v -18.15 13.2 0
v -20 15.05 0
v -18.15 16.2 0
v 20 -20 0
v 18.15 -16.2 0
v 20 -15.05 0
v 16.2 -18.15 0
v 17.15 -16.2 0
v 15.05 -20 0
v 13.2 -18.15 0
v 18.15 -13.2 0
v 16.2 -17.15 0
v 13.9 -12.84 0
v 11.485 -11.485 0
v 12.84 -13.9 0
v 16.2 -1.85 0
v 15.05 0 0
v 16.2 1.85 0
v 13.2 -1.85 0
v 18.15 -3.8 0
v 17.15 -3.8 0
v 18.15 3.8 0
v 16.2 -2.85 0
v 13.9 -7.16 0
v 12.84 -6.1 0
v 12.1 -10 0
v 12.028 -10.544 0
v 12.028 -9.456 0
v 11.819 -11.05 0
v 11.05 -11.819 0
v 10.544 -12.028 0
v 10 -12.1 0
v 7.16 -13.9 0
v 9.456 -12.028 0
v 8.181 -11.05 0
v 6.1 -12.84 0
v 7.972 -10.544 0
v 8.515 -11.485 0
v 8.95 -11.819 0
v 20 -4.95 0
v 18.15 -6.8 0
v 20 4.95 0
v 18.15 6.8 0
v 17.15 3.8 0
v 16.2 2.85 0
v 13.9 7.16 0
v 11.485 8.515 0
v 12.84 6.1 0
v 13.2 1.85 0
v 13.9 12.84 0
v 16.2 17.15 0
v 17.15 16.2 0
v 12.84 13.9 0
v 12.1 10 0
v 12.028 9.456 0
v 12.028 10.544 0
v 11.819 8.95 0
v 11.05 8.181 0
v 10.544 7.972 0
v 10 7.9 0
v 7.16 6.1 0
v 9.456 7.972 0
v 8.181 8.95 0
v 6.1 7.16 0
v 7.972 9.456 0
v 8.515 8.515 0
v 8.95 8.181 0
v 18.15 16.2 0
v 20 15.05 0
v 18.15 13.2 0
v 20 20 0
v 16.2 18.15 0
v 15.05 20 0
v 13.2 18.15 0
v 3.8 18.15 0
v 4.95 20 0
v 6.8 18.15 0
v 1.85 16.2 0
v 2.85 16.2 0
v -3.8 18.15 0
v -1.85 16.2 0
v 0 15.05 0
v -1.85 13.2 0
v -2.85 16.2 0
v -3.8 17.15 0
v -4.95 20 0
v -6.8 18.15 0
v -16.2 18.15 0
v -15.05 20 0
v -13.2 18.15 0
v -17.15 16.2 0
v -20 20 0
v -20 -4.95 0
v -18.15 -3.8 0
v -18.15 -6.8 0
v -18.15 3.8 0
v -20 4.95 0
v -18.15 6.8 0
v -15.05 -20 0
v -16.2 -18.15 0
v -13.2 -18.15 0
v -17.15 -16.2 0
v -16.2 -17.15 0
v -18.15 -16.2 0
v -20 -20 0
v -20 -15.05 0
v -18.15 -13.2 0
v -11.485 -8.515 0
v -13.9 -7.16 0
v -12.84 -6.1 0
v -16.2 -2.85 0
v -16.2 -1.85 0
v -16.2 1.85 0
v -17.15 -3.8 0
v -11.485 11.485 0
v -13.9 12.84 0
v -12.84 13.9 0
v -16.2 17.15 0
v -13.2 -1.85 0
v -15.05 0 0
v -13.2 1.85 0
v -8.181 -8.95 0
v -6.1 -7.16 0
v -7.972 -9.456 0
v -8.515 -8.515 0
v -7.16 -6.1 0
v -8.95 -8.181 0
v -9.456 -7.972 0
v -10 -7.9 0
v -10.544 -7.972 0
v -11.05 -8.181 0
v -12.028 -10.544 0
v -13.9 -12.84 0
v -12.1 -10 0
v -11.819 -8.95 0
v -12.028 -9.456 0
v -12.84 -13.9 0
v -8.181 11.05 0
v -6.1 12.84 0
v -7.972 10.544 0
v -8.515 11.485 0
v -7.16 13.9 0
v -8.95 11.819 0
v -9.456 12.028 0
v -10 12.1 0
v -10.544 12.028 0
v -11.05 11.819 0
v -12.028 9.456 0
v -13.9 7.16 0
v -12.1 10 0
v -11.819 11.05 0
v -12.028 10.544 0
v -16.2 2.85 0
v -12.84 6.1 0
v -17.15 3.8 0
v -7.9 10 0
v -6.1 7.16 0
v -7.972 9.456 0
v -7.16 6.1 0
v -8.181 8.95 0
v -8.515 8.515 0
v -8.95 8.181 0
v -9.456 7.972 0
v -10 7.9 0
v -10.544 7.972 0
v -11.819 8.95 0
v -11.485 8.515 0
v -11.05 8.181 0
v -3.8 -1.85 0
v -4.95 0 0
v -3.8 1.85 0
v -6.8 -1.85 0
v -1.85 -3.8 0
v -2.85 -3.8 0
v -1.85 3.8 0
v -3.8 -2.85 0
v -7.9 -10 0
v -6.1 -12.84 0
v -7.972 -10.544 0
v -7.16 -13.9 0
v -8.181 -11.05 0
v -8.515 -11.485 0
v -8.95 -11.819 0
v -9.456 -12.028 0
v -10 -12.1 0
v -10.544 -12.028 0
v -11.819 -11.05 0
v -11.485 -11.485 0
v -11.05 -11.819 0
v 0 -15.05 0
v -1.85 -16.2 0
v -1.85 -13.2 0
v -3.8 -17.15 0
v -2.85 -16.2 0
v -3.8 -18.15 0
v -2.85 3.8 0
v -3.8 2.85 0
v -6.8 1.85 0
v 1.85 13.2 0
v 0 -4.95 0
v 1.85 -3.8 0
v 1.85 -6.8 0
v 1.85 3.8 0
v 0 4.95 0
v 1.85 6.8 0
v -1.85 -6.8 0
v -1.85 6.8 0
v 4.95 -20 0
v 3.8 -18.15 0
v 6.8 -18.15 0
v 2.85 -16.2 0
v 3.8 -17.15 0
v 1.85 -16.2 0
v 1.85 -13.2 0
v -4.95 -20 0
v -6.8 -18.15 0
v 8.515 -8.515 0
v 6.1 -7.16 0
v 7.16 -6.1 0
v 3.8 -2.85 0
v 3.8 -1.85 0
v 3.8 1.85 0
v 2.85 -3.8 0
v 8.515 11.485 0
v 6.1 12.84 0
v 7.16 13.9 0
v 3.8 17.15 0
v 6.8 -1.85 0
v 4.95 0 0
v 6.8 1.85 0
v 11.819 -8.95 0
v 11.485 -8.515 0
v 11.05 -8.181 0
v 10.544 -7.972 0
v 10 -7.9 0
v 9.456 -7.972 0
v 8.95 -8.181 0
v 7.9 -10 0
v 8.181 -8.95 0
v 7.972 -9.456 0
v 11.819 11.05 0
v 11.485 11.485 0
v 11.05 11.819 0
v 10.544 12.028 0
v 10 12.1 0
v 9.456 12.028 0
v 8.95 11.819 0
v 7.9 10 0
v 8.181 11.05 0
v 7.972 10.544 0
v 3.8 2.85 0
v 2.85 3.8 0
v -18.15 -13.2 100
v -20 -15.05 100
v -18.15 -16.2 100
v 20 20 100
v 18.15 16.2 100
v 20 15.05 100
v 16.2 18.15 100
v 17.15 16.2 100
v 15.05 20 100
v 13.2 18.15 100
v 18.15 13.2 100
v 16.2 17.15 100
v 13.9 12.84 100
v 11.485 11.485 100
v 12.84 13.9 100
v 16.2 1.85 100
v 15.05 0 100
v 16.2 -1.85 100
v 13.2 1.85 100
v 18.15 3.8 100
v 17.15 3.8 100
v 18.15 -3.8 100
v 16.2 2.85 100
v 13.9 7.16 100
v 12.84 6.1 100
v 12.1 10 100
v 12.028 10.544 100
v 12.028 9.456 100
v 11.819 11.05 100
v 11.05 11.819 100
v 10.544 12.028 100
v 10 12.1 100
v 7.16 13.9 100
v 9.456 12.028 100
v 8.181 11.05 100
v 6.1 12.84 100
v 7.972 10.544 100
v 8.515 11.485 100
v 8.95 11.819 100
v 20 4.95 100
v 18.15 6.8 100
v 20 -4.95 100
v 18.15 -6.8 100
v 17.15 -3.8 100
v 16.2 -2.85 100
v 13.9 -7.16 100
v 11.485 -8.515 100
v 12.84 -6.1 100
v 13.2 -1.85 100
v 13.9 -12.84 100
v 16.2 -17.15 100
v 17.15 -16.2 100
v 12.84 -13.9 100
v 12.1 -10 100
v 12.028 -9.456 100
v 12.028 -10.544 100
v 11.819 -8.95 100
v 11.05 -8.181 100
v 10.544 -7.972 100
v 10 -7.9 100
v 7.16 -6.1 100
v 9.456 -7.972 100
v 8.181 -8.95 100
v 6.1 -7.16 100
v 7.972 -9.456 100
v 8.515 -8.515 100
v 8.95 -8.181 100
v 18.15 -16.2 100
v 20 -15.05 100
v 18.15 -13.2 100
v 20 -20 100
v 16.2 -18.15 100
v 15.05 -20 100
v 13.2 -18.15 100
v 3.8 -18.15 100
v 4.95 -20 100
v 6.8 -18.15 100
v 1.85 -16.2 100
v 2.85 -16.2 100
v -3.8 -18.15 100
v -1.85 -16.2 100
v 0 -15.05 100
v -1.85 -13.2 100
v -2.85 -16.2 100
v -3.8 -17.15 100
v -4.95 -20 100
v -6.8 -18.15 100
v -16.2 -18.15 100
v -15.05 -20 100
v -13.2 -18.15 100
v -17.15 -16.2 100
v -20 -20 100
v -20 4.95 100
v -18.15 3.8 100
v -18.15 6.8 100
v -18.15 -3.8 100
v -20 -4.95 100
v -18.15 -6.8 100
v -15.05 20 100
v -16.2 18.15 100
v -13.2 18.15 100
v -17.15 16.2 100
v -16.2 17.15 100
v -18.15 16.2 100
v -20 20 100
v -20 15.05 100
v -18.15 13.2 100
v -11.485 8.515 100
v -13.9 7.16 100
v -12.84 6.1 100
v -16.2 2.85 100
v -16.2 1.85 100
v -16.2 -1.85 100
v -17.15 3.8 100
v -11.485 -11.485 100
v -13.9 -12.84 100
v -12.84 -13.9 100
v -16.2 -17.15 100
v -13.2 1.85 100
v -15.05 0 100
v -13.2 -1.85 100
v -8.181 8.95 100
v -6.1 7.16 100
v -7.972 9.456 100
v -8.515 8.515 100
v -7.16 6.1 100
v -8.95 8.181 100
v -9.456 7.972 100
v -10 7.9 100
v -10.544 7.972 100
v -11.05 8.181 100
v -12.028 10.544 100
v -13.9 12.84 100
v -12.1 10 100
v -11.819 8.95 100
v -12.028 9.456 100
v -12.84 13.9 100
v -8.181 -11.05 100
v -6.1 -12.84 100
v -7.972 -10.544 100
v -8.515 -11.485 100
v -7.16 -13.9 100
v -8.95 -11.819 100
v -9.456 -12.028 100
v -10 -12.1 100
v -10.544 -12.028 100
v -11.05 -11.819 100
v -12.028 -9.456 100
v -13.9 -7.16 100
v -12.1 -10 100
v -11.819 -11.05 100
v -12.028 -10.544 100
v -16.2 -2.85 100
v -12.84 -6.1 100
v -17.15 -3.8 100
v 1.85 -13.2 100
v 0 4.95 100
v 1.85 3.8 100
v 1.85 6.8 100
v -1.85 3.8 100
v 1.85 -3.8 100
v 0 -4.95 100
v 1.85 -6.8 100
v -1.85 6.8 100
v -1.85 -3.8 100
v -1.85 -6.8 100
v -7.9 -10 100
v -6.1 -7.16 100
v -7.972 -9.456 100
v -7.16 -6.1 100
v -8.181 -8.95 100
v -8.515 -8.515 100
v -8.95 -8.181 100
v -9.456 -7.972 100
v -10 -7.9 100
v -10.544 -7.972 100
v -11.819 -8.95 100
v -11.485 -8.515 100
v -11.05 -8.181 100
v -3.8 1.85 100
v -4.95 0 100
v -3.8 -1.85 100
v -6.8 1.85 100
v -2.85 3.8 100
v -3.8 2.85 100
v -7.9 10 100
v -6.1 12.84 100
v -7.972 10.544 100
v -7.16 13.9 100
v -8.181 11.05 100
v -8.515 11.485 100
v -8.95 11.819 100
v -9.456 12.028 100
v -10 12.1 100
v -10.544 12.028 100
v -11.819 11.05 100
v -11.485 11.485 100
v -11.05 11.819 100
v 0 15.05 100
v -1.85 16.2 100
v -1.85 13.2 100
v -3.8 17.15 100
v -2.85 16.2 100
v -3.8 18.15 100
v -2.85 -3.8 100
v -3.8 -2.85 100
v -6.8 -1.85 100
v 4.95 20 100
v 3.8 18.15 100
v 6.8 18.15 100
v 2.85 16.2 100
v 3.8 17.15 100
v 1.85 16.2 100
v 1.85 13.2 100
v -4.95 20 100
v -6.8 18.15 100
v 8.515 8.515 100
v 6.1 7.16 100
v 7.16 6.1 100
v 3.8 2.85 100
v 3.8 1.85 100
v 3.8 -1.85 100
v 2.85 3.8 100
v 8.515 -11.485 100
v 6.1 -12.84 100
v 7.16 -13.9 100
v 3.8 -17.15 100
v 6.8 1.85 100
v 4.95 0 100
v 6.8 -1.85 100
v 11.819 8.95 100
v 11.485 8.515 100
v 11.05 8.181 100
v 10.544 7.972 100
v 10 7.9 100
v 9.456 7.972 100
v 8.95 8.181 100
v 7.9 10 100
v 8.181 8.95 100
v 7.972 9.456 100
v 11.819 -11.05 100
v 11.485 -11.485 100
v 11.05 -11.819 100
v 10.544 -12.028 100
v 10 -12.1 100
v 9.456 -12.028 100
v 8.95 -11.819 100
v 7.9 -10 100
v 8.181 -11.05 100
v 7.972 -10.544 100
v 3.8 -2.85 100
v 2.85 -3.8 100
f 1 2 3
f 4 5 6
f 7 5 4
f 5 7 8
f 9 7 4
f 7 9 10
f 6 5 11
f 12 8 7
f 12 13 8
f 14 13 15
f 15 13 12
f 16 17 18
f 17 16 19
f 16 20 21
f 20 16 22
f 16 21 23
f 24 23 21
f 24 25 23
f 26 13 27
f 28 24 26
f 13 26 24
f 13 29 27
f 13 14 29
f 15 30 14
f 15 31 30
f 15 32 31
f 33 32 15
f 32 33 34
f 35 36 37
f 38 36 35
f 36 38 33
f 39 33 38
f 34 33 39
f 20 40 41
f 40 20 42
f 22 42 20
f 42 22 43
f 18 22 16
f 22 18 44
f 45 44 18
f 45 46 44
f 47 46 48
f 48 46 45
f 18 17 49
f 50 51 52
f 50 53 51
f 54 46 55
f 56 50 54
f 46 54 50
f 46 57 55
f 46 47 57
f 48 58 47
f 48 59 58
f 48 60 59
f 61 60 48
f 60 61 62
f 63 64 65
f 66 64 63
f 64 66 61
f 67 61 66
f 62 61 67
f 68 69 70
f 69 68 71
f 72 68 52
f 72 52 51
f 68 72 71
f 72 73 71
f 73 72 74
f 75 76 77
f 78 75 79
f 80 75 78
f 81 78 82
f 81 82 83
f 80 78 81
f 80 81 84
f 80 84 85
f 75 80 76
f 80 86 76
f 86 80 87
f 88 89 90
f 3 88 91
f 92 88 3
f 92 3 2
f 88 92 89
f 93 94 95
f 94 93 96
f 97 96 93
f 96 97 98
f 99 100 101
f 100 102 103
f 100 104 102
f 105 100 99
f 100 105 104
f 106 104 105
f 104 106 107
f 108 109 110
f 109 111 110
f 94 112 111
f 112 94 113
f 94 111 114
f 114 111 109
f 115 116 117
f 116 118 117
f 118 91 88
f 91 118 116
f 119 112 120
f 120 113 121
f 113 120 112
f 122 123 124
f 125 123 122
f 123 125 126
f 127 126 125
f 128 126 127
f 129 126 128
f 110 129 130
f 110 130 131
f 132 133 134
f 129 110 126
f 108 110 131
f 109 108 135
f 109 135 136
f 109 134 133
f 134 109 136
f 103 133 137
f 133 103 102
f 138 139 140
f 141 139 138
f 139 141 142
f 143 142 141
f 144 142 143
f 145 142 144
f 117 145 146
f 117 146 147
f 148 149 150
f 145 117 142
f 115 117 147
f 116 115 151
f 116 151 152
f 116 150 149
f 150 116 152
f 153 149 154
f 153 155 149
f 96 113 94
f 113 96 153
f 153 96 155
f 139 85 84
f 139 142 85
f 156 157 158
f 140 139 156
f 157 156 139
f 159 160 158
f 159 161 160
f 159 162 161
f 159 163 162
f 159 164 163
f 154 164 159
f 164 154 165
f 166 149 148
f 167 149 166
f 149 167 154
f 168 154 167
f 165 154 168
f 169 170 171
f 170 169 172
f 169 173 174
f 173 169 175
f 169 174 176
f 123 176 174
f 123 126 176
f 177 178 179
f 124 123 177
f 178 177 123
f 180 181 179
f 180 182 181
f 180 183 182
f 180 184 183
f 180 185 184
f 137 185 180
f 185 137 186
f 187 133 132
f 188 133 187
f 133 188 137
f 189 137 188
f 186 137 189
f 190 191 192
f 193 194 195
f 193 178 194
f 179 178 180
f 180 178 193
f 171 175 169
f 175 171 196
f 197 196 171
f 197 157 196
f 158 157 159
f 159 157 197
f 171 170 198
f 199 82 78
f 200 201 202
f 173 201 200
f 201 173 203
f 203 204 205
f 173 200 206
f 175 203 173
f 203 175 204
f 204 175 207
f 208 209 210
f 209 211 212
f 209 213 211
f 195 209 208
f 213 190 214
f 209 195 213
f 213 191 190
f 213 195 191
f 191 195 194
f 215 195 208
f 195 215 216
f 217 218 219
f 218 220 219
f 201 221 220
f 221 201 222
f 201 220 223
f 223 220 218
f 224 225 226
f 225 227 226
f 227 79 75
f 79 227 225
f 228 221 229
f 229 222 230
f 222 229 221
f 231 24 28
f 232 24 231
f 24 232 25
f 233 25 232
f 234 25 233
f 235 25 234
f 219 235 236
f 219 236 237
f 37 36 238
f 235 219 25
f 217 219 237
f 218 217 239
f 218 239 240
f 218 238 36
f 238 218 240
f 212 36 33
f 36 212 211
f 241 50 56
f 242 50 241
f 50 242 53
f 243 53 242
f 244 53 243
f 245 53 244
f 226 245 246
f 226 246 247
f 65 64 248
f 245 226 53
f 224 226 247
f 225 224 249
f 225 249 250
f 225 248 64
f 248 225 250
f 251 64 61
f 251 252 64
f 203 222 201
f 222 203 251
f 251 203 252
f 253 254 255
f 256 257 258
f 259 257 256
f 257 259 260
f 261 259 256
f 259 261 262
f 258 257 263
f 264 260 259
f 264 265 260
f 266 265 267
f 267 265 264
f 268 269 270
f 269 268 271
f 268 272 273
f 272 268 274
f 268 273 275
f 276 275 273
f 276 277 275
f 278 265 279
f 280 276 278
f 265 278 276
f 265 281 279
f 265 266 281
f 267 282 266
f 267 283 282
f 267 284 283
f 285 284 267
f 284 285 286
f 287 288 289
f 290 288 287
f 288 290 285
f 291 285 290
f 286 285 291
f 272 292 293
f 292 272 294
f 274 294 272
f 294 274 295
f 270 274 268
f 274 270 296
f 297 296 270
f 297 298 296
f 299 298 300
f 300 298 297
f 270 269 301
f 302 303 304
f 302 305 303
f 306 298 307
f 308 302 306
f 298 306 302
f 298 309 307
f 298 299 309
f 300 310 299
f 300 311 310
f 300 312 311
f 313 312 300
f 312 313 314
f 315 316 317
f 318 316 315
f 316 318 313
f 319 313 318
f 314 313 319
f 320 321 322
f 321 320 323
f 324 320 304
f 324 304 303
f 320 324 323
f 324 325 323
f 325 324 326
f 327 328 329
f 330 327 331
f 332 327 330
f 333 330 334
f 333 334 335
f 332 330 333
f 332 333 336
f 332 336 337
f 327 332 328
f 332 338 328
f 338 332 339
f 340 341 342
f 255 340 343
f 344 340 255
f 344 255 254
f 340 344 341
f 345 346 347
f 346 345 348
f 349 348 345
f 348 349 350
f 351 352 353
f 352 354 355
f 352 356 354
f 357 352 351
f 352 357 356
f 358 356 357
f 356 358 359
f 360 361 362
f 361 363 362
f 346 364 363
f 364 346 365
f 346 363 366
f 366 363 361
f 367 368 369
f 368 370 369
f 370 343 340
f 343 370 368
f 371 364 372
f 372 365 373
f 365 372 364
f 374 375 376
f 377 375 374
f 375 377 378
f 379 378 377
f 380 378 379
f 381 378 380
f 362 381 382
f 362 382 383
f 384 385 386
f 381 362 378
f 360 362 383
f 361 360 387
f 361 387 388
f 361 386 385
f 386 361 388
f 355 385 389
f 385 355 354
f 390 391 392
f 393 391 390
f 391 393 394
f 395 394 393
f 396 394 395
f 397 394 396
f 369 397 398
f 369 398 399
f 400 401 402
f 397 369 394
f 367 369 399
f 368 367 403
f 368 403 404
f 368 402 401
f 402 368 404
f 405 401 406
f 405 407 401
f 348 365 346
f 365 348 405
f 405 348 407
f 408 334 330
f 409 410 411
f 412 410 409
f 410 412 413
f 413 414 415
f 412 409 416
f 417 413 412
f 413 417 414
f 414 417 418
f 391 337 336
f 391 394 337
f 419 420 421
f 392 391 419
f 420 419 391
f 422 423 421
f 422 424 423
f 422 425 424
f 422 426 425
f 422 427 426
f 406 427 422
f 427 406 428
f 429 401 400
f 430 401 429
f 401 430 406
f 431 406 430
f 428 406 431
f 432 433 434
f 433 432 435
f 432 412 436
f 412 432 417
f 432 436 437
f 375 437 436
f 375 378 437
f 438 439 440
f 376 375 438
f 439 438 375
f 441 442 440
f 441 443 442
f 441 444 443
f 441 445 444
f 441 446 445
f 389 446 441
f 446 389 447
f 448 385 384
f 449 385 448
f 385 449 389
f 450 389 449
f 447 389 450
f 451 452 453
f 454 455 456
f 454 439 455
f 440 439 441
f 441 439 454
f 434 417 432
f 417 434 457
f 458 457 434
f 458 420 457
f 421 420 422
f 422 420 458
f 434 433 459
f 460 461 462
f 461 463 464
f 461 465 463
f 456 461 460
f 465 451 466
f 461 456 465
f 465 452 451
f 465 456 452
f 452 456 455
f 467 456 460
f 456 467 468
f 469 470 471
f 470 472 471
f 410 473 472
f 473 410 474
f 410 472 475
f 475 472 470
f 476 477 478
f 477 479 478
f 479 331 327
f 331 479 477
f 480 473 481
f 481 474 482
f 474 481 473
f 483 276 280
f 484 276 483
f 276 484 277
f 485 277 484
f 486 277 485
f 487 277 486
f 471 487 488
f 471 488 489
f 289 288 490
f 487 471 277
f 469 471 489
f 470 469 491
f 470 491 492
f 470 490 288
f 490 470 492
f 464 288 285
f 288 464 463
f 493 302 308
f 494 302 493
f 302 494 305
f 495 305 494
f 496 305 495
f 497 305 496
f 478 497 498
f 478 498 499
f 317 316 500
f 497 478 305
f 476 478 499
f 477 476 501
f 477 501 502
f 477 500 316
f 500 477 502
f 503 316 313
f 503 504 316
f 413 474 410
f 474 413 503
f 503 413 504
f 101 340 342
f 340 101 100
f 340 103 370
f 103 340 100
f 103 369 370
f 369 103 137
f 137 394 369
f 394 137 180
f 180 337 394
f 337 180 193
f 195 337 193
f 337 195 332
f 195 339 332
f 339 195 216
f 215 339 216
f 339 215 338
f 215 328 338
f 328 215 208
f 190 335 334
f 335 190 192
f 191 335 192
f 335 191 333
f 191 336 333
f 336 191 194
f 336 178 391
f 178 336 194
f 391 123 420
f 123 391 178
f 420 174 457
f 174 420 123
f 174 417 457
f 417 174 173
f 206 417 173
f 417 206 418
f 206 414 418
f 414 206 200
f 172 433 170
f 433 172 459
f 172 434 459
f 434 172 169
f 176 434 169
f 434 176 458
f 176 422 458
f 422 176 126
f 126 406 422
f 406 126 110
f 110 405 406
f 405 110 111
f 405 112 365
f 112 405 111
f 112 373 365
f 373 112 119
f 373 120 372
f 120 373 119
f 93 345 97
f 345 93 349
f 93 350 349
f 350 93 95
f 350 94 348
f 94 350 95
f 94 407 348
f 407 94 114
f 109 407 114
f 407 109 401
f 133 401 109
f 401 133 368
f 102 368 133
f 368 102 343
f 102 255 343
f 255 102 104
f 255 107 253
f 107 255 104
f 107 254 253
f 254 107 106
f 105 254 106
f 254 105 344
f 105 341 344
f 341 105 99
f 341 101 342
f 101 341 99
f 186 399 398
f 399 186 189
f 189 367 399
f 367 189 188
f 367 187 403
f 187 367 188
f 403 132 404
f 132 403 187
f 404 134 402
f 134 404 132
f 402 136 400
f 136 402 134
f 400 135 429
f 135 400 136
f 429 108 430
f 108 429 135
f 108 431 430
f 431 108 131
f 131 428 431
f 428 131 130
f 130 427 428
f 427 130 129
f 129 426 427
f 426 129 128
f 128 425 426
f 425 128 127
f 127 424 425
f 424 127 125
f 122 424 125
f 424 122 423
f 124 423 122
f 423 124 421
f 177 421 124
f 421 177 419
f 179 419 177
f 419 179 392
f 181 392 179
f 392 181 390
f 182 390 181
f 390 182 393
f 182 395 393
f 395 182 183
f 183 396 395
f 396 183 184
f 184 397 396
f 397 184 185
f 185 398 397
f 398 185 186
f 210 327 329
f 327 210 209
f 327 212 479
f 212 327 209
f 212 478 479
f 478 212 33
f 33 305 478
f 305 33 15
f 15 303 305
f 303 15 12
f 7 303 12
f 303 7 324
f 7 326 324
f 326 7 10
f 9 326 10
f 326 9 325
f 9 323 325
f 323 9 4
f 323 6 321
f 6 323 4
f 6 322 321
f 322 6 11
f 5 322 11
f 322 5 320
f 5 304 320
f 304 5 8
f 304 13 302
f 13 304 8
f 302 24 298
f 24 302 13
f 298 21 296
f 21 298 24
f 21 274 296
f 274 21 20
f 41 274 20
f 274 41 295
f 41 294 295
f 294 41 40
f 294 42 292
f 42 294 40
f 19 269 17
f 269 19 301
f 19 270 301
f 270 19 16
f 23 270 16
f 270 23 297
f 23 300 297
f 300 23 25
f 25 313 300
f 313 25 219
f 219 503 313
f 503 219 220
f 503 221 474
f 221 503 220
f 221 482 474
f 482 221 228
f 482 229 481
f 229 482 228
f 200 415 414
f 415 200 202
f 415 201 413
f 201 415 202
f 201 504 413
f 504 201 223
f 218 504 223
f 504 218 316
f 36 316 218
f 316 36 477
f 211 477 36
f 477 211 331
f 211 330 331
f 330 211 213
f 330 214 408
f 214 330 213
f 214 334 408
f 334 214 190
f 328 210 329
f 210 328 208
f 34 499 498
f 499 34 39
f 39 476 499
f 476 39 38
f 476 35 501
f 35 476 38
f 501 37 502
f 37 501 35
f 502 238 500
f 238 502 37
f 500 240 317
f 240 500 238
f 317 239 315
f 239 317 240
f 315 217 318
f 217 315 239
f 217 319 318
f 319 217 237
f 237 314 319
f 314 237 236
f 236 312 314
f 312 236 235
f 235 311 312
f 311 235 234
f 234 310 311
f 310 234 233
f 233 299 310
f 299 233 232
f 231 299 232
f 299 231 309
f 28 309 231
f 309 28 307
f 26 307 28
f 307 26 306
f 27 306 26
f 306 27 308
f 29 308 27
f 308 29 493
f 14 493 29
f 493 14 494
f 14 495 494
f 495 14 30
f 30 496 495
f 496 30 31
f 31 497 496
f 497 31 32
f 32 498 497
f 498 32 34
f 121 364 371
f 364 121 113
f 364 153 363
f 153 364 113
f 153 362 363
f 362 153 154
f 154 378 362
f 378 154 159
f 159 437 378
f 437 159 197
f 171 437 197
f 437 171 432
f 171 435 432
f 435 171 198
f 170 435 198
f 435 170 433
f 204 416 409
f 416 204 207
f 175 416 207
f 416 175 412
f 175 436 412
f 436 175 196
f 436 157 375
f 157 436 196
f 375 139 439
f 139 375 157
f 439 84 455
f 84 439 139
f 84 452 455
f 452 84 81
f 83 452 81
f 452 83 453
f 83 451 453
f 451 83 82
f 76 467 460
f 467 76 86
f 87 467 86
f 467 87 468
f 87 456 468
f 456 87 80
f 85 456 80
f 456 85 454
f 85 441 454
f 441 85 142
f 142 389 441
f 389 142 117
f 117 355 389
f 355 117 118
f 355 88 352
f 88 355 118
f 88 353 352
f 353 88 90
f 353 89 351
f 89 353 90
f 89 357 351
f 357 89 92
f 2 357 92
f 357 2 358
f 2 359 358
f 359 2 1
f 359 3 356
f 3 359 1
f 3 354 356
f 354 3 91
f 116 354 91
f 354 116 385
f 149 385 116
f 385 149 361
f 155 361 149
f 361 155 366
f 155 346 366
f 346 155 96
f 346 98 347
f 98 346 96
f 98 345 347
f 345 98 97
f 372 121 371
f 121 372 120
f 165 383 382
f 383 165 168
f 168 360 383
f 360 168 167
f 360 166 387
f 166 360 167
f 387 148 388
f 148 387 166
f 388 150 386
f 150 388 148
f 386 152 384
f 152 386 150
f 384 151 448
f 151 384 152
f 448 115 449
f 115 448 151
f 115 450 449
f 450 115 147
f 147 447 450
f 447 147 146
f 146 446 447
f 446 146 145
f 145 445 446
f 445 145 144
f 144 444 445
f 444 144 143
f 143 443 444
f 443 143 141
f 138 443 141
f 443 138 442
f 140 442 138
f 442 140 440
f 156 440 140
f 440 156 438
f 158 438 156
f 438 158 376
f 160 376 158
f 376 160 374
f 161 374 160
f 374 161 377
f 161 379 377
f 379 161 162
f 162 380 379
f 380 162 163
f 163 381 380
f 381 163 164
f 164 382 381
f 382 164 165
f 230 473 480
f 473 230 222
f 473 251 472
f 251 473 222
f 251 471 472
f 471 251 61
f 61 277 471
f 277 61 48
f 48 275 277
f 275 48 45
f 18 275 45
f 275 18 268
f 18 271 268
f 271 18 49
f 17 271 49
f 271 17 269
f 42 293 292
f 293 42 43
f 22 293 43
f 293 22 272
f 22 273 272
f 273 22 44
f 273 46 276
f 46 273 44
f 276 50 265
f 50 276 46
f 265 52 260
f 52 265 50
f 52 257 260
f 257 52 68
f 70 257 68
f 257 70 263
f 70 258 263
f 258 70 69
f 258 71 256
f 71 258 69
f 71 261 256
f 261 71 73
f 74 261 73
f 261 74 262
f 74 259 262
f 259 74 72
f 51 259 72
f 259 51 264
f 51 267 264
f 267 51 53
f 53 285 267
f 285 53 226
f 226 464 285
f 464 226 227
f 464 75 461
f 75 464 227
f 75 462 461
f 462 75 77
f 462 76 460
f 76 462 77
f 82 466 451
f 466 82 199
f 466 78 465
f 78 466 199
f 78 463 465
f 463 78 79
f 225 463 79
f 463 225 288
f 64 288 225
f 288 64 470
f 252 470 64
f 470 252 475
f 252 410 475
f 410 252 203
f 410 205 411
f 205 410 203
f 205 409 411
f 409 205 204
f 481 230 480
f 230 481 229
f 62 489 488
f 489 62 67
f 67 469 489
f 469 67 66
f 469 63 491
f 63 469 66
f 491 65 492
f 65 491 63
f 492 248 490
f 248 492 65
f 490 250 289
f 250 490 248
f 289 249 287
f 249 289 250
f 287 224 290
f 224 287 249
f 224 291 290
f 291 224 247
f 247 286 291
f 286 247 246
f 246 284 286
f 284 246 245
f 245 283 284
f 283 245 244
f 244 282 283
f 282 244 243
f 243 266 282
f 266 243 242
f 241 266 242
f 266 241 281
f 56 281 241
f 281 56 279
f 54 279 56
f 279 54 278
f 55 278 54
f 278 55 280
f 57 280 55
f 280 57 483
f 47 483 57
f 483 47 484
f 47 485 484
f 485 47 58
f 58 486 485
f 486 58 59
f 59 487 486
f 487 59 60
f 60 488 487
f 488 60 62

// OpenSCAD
$fn=24;
module v_slot_8th(){
	polygon([[0,0],[3.9,0],[3.9,2.84],[7.15,6.2],[8.15,6.2],[8.15,3.2],[10,3.2+1.85],[10,10]]);
}
module v_profile_2020(){
	difference(){
		for(th=[0:90:360]) rotate(th){
			scale([-1,1])v_slot_8th();
			v_slot_8th();
		}
		circle(d=4.2);
	}
}

module extruded_2020_v(length=100){
	linear_extrude(length,convexity=6)v_profile_2020();
}
module extruded_2040_v(length=100){
	translate([-10,0])extruded_2020_v(length);
	translate([10,0])extruded_2020_v(length);
}
module extruded_4040_v(length=100){
	translate([0,-10])extruded_2040_v(length);
	translate([0,10])extruded_2040_v(length);
}

extruded_4040_v();
